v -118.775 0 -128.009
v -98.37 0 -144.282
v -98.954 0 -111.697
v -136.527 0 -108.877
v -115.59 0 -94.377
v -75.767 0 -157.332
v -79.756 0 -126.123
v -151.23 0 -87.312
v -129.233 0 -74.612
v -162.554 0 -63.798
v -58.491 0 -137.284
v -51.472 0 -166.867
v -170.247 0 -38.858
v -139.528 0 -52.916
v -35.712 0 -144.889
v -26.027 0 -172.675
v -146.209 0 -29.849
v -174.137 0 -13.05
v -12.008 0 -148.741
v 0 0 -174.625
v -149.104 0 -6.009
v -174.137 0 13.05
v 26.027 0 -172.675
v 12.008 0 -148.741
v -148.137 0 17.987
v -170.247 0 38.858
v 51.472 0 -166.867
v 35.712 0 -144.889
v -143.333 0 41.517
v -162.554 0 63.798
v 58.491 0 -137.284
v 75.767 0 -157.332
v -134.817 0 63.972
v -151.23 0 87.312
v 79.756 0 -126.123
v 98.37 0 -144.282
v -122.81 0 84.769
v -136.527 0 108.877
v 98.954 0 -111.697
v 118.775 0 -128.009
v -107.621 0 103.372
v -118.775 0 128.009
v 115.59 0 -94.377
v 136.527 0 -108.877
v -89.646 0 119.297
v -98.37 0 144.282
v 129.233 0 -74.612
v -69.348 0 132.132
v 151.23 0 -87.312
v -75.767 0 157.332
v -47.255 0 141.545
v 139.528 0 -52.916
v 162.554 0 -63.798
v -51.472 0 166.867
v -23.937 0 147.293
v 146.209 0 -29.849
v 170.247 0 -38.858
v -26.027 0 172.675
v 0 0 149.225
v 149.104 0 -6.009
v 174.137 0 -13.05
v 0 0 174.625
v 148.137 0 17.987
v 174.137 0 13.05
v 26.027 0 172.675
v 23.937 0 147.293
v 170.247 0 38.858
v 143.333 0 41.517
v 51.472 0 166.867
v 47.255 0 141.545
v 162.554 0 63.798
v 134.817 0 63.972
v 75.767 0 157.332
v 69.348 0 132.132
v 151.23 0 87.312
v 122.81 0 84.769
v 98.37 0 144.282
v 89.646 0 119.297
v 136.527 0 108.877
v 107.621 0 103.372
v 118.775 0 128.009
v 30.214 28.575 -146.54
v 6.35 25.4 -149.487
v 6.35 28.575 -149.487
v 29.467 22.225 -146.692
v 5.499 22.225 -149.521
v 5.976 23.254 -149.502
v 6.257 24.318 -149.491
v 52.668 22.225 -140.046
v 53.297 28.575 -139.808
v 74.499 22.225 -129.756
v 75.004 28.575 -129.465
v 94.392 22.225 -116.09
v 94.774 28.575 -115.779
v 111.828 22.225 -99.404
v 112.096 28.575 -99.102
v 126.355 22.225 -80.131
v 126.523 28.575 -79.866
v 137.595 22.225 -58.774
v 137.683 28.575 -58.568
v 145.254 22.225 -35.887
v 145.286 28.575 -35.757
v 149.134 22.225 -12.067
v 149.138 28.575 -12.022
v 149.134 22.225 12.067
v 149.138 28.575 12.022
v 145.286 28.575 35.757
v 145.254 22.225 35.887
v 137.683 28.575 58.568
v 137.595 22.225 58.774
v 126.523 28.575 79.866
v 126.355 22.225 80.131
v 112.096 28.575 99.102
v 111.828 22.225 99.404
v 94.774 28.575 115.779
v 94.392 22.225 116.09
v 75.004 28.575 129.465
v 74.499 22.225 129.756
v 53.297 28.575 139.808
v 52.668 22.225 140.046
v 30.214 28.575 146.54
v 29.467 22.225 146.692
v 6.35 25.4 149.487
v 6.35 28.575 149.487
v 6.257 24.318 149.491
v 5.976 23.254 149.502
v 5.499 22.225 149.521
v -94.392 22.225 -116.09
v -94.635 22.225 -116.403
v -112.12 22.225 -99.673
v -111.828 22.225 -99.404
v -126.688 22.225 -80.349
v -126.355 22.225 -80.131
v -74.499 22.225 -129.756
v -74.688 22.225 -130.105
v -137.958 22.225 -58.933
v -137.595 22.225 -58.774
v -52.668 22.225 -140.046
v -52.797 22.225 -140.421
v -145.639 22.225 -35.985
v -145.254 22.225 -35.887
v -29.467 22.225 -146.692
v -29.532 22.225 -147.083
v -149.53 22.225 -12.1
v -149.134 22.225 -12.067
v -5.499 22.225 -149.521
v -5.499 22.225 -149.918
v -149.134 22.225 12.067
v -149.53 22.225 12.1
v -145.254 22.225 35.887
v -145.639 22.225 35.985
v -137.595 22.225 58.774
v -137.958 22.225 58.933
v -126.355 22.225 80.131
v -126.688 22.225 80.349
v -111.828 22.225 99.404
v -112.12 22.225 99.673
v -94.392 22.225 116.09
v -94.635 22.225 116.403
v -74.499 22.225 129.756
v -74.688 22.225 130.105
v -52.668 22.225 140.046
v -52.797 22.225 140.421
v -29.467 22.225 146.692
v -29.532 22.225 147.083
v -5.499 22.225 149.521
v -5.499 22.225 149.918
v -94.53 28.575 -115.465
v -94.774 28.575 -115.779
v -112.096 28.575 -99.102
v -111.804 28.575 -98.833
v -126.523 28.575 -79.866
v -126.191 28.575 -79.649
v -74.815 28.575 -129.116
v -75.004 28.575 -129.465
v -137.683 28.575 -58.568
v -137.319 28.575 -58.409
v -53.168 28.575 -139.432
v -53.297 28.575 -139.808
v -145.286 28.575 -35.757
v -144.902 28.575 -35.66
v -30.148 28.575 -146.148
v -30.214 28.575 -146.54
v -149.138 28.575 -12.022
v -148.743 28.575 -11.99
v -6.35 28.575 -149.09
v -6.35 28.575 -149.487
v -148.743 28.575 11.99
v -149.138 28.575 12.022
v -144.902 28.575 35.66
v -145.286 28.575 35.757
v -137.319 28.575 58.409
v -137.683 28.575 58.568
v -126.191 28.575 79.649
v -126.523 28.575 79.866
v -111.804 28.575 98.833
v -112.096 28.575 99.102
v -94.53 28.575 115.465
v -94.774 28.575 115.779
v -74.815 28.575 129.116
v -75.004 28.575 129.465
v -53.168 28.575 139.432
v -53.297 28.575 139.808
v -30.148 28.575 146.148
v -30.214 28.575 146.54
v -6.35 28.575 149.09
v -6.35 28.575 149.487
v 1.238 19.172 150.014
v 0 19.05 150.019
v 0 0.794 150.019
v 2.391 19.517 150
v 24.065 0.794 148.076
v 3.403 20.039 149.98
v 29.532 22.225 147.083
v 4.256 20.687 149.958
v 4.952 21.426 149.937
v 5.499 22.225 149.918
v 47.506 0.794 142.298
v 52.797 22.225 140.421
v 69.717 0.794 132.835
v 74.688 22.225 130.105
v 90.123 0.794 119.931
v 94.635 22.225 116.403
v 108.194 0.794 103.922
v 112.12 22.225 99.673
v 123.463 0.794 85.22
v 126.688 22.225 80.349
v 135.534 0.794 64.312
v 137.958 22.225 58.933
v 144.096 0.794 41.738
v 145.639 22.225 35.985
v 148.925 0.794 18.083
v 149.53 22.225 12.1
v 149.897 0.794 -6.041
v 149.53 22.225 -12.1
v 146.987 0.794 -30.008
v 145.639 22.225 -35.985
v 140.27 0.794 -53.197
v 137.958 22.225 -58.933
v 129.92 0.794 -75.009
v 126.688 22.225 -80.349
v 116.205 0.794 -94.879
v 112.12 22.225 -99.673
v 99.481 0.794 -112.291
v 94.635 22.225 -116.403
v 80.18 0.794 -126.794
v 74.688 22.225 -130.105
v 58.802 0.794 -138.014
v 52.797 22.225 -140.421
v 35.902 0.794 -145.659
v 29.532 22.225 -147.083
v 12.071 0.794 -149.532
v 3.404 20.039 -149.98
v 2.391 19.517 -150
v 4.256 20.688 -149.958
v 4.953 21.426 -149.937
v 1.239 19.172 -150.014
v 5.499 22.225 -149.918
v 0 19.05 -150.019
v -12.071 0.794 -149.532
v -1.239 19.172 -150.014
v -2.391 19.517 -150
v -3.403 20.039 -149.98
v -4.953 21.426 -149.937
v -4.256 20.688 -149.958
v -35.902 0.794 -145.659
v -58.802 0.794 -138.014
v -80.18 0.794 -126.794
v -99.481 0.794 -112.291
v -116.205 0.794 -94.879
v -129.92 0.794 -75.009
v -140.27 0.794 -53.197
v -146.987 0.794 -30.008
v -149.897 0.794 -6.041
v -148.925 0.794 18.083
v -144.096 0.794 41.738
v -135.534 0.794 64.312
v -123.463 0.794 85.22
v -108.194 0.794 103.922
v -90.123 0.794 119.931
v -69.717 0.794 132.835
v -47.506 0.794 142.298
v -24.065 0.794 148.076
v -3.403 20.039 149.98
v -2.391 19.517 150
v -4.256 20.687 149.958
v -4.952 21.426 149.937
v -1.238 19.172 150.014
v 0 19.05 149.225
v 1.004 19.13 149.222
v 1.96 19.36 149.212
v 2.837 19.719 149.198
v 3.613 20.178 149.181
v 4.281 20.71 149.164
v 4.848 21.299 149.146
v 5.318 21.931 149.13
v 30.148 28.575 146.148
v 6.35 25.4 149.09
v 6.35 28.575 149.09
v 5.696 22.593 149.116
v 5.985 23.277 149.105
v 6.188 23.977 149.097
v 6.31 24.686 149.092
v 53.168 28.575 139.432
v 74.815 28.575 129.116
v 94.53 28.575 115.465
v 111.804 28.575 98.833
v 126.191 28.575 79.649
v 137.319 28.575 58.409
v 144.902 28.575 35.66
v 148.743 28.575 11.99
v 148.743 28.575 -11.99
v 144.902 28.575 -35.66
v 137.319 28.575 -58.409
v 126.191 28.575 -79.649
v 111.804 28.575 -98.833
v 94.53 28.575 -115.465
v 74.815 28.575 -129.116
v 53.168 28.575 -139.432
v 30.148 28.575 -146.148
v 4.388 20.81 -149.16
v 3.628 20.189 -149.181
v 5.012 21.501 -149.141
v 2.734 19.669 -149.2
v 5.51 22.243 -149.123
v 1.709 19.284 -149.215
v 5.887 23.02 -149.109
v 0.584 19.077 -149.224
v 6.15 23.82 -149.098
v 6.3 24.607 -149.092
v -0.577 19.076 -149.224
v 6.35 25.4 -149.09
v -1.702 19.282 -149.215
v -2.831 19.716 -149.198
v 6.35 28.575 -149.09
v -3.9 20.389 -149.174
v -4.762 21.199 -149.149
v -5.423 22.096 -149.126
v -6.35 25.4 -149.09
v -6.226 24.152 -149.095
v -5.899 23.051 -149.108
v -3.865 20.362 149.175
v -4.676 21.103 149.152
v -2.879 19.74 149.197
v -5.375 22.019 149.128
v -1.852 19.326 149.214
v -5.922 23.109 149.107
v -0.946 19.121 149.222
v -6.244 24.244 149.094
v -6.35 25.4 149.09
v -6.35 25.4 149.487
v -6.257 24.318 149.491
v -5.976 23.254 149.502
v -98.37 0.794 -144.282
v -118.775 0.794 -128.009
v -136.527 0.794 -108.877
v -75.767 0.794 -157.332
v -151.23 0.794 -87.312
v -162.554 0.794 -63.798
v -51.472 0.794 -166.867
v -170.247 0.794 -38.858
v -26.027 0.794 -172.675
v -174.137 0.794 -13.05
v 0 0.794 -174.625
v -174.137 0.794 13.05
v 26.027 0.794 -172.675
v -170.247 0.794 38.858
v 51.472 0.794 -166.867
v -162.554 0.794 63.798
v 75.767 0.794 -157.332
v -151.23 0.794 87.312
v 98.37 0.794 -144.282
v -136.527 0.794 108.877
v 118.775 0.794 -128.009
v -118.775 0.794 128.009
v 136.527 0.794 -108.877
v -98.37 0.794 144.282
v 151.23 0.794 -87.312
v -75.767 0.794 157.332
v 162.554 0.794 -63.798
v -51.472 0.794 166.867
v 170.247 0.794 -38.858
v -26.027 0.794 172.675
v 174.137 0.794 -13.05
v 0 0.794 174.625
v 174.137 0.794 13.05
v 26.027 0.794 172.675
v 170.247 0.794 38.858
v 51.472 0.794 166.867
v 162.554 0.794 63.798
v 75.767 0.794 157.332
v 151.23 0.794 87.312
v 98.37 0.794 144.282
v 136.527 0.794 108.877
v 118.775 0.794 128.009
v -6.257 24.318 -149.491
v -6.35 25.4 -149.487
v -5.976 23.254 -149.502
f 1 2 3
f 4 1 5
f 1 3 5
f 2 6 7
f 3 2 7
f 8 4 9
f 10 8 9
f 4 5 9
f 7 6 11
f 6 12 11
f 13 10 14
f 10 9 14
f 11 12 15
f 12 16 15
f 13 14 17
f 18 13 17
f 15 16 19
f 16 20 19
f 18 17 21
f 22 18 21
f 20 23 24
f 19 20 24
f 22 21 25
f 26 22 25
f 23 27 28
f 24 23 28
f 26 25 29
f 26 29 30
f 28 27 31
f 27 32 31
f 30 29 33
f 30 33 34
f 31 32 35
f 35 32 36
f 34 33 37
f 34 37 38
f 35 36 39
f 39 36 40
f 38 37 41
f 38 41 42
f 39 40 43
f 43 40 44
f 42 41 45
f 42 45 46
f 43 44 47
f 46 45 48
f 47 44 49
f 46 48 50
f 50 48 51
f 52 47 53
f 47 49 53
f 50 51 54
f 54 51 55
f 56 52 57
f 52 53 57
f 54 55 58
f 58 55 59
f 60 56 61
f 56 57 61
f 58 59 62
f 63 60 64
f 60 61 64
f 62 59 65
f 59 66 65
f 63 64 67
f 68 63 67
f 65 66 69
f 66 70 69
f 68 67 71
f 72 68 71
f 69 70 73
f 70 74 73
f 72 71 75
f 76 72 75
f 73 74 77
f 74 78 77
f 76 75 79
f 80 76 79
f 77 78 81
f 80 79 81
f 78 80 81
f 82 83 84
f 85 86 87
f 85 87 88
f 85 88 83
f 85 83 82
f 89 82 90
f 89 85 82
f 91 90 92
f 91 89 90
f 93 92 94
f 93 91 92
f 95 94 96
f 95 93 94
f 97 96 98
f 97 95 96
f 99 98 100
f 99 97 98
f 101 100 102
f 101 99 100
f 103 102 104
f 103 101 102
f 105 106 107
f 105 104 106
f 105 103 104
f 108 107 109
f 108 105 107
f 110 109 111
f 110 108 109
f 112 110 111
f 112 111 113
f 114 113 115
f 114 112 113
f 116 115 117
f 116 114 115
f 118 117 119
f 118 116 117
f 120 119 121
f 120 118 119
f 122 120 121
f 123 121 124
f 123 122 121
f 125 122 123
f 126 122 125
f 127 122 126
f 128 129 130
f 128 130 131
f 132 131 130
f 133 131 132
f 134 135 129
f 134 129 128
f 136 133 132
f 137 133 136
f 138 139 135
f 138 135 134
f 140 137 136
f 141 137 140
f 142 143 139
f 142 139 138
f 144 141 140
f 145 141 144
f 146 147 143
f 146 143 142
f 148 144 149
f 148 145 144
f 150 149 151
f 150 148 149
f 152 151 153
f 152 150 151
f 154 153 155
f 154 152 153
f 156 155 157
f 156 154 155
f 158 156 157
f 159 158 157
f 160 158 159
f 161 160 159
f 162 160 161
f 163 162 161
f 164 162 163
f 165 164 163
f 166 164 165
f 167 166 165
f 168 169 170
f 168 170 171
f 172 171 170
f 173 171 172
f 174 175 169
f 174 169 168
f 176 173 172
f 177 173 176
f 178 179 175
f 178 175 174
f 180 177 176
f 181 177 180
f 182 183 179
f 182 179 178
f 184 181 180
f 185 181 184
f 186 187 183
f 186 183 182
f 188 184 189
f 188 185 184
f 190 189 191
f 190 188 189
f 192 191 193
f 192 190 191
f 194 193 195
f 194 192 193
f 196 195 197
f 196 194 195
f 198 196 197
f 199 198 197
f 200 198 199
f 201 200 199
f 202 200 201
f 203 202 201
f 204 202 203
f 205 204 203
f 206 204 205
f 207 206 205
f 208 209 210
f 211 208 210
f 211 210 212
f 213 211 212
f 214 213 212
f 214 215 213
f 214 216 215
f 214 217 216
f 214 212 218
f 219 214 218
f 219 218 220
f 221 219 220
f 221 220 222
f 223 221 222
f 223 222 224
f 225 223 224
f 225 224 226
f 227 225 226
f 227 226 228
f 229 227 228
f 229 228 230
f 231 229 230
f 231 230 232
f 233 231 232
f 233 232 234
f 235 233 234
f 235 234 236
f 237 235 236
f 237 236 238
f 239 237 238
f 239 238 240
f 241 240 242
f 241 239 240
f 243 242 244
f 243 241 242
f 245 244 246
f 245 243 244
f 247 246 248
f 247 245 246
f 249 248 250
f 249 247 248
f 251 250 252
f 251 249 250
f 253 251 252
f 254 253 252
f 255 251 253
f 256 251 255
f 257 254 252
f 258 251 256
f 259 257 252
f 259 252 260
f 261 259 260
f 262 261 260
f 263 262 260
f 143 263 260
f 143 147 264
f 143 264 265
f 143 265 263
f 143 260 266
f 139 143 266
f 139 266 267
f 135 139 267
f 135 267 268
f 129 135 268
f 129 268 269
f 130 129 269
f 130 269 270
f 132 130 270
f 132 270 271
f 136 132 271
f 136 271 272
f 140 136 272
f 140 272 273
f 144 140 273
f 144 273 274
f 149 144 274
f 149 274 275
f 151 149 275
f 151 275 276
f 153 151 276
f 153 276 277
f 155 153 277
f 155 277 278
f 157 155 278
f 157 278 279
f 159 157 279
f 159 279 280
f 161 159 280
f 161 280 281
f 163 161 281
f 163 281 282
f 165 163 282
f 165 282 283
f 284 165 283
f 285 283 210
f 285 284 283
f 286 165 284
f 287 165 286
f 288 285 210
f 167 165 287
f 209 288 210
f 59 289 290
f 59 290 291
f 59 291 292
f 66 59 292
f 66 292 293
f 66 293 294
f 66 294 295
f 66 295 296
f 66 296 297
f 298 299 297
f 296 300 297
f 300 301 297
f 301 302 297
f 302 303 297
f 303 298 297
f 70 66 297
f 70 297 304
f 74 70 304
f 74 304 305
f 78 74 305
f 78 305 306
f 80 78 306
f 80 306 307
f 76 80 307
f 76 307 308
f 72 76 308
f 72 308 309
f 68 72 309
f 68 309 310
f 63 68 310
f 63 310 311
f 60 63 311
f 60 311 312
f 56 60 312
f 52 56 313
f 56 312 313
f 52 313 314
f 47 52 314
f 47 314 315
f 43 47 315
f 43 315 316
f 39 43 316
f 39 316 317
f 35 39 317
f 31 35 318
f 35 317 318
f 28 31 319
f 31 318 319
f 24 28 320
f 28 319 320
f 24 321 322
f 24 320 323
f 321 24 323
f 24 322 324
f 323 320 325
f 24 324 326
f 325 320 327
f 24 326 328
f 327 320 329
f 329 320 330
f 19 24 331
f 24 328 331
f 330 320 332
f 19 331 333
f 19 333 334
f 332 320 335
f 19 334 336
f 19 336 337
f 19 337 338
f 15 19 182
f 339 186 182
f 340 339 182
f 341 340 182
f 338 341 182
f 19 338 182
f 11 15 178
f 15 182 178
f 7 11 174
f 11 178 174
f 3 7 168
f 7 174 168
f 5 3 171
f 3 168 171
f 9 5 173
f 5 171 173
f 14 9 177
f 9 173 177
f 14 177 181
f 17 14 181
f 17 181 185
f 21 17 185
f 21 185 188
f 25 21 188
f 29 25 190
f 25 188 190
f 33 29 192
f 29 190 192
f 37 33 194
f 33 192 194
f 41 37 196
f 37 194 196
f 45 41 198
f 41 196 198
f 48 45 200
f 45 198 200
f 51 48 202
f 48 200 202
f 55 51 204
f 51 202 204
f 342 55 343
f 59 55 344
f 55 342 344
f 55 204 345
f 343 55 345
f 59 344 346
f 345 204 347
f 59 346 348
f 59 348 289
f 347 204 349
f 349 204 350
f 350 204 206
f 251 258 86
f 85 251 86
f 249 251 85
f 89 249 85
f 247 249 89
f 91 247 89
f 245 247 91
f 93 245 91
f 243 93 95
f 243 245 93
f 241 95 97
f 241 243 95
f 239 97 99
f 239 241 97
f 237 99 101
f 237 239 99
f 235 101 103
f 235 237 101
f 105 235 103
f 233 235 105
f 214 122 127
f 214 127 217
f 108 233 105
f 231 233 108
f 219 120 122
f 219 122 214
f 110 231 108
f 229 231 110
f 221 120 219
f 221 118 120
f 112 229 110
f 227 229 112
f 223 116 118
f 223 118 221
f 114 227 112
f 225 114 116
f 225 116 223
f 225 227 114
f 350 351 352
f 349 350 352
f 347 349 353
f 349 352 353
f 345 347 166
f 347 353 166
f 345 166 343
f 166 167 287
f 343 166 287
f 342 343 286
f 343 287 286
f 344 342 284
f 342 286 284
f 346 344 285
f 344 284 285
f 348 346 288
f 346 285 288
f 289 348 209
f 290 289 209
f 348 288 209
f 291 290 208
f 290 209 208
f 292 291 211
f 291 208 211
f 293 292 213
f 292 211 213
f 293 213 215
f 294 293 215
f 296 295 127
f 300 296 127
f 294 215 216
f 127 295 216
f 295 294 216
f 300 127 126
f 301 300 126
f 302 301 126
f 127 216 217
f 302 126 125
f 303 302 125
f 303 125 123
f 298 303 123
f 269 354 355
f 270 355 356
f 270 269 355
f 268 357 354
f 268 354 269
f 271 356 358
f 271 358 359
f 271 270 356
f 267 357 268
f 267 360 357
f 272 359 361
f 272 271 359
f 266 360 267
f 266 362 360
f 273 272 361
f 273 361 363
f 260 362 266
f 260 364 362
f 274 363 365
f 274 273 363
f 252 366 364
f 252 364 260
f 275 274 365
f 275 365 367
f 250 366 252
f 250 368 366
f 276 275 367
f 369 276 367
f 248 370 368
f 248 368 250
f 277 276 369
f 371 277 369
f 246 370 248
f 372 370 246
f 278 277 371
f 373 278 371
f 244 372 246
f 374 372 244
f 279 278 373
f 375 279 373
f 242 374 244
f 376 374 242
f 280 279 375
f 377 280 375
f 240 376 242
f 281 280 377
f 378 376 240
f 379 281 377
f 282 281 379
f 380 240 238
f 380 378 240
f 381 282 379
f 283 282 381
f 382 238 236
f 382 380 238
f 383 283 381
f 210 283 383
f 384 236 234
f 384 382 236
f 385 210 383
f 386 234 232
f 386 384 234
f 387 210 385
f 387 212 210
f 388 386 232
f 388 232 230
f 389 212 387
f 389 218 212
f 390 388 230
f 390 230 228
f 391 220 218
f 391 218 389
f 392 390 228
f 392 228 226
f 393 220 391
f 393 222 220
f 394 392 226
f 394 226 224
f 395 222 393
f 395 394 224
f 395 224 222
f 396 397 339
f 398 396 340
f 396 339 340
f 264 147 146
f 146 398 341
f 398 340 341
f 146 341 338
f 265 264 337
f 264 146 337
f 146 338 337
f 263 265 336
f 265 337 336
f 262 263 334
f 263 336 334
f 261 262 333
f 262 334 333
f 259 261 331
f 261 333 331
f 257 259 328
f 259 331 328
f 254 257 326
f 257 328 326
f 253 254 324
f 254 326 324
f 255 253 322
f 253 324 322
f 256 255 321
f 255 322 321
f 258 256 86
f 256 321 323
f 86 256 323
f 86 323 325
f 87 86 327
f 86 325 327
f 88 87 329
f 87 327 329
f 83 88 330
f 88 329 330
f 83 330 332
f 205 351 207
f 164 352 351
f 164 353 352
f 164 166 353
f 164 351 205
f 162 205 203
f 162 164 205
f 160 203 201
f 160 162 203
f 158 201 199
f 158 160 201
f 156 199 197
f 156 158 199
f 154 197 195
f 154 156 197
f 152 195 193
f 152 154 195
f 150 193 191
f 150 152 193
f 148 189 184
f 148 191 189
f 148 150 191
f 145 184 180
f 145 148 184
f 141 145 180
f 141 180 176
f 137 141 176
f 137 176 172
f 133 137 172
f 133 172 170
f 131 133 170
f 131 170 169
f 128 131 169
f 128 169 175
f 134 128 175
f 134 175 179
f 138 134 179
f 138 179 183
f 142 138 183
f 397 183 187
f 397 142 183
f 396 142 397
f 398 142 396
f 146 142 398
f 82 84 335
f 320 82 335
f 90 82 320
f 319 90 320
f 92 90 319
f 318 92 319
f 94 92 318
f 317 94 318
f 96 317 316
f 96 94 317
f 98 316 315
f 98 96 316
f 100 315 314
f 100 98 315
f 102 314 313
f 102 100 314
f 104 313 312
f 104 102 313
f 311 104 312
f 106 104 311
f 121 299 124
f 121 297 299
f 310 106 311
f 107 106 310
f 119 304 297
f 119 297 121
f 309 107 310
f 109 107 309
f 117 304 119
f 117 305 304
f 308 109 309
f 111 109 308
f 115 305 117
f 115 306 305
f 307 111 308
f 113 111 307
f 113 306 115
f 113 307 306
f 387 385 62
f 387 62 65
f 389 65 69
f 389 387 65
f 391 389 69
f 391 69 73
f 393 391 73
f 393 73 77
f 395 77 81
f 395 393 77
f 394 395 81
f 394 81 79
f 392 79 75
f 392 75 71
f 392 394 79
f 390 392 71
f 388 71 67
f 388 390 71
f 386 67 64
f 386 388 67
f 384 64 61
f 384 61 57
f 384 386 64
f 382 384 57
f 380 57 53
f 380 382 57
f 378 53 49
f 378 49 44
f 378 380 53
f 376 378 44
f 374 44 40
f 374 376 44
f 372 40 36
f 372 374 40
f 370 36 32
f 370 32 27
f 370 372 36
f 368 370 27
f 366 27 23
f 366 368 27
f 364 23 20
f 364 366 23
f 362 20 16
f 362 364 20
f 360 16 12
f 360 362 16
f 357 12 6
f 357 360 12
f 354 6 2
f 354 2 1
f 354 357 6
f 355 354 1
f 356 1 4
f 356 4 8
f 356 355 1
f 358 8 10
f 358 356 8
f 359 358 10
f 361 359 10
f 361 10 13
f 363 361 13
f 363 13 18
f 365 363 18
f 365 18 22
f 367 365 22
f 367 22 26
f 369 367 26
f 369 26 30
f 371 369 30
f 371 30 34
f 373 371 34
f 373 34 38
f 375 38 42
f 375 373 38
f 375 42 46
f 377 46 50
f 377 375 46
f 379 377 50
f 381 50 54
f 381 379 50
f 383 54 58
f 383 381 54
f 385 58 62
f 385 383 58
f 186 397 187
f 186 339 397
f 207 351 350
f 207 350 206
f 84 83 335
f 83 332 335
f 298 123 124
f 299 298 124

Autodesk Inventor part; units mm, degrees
ref_plane "YZ Plane" through (0, 0, 0) normal (1, 0, 0) x (0, 1, 0)
ref_plane "XZ Plane" through (0, 0, 0) normal (0, 1, 0) x (-1, 0, 0)
sketch "Sketch1" plane through (0, 0, 0) normal (1, 0, 0) x (0, 1, 0)
  line L0 (0, 0) -> (1.9826, 0)
  line L1 (0, 149.225) -> (25.4, 149.225)
  line L2 (0, 149.225) -> (0, 174.625)
  line L3 (0, 174.625) -> (0.7937, 174.625)
  line L4 (0.7937, 174.625) -> (0.7937, 150.0187)
  line L5 (0.7937, 150.0187) -> (22.225, 150.0187)
  line L6 (25.4, 149.6219) -> (25.4, 149.225)
  line L7 (25.4, 149.225) -> (28.575, 149.225)
  line L8 (28.575, 149.225) -> (28.575, 149.6219)
  line L9 (28.575, 149.6219) -> (22.225, 149.6219)
  line L10 (22.225, 149.6219) -> (22.225, 150.0187)
  point P0 (0.3969, 174.625)
  dimension "d0" = 25.4
  dimension "d1" = 149.225
  dimension "d2" = 25.4
  dimension "d3" = 0.7937
  dimension "d4" = 24.6062
  dimension "d5" = 3.175
  dimension "d6" = 6.35
revolve "Revolution1" add sketch "Sketch1" angle 360 about axis through (0, 0, 0) along (0, 1, 0)
ref_plane "Work Plane1" through (0, 0.3969, 174.625) normal (0, 0, 1) x (1, 0, 0)
sketch "Sketch2" plane through (0, 0.3969, 174.625) normal (0, 0, 1) x (1, 0, 0)
  line L0 (149.6219, 28.1781) -> (-149.6219, 28.1781) projected
  arc A0 (-6.35, 25.0031) -> (6.35, 25.0031) centre (0, 25.0031) ccw
  line L1 (-6.35, 25.0031) -> (-6.35, 28.1781)
  line L2 (6.35, 25.0031) -> (6.35, 28.1781)
  line L3 (149.225, 28.1781) -> (-149.225, 28.1781) projected
  line L4 (-6.35, 28.1781) -> (6.35, 28.1781)
  point P0 (0, -0.3969)
  dimension "d8" = 3.175
  dimension "d9" = 0
  dimension "d10" = 12.7
extrude "Extrusion1" cut sketch "Sketch2" against normal through all
properties part number "Layer2_Bottom"
